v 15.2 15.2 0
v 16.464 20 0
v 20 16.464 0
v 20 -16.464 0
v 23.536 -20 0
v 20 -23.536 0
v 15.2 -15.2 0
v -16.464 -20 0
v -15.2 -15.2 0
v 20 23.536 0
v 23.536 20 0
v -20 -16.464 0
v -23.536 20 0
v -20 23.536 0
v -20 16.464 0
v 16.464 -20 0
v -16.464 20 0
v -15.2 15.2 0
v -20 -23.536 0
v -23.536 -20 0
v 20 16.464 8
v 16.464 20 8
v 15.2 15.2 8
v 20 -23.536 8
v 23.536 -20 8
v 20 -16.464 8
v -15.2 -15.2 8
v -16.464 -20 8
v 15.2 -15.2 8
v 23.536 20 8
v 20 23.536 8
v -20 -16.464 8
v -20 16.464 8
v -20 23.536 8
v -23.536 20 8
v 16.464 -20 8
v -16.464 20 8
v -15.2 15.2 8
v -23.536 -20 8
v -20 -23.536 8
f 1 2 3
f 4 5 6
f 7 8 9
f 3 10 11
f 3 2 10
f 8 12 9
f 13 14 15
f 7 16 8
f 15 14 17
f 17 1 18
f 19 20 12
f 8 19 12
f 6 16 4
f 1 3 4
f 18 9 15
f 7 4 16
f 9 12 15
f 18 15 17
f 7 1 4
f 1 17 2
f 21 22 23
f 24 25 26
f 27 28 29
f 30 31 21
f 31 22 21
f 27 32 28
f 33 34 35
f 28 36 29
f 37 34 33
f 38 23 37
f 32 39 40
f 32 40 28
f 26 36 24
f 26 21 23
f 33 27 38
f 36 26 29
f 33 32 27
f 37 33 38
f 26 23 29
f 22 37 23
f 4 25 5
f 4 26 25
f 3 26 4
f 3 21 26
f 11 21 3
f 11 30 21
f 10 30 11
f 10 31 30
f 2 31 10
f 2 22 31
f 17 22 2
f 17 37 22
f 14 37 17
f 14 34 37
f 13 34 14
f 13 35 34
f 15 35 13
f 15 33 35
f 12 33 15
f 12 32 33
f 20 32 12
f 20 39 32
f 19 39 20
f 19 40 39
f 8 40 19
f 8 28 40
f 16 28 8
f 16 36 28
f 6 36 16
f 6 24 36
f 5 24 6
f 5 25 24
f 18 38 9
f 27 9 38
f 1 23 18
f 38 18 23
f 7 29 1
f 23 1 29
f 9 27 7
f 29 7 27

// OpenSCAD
// the model's resolution
model_resolution = 50;

/*
circle_guide_frame(
    inlay_size = 140,
    frame_width = 15,
    guide_height = 8,
    resolution = model_resolution);*/


circle_guide_frame(
    inlay_size = 30,
    frame_width = 5,
    guide_height = 8,
    resolution = model_resolution);


// Hack a plunge router template using all parameters
// undef default values will be calculated/set automatically
module circle_guide_frame(
  inlay_size,    // the size for matching inlays
  frame_width,   // the frame's width required for the guide template
  guide_height,  // the template guide's height
  resolution = model_resolution) {
    frame_len = inlay_size+2*frame_width;
    linear_extrude(height=guide_height) {
        difference() {
            union() {
                square(frame_len, center=true);
                rotate([0,0,45]) {
                    square([sqrt(2)*frame_len+frame_width, frame_width], center=true);  
                }
                rotate([0,0,-45]) {
                    square([sqrt(2)*frame_len+frame_width, frame_width], center=true);
                }
            }
            // increase the inlay size to adjust for expanding material
            square(inlay_size+0.4, center=true);
        }
    }
}
